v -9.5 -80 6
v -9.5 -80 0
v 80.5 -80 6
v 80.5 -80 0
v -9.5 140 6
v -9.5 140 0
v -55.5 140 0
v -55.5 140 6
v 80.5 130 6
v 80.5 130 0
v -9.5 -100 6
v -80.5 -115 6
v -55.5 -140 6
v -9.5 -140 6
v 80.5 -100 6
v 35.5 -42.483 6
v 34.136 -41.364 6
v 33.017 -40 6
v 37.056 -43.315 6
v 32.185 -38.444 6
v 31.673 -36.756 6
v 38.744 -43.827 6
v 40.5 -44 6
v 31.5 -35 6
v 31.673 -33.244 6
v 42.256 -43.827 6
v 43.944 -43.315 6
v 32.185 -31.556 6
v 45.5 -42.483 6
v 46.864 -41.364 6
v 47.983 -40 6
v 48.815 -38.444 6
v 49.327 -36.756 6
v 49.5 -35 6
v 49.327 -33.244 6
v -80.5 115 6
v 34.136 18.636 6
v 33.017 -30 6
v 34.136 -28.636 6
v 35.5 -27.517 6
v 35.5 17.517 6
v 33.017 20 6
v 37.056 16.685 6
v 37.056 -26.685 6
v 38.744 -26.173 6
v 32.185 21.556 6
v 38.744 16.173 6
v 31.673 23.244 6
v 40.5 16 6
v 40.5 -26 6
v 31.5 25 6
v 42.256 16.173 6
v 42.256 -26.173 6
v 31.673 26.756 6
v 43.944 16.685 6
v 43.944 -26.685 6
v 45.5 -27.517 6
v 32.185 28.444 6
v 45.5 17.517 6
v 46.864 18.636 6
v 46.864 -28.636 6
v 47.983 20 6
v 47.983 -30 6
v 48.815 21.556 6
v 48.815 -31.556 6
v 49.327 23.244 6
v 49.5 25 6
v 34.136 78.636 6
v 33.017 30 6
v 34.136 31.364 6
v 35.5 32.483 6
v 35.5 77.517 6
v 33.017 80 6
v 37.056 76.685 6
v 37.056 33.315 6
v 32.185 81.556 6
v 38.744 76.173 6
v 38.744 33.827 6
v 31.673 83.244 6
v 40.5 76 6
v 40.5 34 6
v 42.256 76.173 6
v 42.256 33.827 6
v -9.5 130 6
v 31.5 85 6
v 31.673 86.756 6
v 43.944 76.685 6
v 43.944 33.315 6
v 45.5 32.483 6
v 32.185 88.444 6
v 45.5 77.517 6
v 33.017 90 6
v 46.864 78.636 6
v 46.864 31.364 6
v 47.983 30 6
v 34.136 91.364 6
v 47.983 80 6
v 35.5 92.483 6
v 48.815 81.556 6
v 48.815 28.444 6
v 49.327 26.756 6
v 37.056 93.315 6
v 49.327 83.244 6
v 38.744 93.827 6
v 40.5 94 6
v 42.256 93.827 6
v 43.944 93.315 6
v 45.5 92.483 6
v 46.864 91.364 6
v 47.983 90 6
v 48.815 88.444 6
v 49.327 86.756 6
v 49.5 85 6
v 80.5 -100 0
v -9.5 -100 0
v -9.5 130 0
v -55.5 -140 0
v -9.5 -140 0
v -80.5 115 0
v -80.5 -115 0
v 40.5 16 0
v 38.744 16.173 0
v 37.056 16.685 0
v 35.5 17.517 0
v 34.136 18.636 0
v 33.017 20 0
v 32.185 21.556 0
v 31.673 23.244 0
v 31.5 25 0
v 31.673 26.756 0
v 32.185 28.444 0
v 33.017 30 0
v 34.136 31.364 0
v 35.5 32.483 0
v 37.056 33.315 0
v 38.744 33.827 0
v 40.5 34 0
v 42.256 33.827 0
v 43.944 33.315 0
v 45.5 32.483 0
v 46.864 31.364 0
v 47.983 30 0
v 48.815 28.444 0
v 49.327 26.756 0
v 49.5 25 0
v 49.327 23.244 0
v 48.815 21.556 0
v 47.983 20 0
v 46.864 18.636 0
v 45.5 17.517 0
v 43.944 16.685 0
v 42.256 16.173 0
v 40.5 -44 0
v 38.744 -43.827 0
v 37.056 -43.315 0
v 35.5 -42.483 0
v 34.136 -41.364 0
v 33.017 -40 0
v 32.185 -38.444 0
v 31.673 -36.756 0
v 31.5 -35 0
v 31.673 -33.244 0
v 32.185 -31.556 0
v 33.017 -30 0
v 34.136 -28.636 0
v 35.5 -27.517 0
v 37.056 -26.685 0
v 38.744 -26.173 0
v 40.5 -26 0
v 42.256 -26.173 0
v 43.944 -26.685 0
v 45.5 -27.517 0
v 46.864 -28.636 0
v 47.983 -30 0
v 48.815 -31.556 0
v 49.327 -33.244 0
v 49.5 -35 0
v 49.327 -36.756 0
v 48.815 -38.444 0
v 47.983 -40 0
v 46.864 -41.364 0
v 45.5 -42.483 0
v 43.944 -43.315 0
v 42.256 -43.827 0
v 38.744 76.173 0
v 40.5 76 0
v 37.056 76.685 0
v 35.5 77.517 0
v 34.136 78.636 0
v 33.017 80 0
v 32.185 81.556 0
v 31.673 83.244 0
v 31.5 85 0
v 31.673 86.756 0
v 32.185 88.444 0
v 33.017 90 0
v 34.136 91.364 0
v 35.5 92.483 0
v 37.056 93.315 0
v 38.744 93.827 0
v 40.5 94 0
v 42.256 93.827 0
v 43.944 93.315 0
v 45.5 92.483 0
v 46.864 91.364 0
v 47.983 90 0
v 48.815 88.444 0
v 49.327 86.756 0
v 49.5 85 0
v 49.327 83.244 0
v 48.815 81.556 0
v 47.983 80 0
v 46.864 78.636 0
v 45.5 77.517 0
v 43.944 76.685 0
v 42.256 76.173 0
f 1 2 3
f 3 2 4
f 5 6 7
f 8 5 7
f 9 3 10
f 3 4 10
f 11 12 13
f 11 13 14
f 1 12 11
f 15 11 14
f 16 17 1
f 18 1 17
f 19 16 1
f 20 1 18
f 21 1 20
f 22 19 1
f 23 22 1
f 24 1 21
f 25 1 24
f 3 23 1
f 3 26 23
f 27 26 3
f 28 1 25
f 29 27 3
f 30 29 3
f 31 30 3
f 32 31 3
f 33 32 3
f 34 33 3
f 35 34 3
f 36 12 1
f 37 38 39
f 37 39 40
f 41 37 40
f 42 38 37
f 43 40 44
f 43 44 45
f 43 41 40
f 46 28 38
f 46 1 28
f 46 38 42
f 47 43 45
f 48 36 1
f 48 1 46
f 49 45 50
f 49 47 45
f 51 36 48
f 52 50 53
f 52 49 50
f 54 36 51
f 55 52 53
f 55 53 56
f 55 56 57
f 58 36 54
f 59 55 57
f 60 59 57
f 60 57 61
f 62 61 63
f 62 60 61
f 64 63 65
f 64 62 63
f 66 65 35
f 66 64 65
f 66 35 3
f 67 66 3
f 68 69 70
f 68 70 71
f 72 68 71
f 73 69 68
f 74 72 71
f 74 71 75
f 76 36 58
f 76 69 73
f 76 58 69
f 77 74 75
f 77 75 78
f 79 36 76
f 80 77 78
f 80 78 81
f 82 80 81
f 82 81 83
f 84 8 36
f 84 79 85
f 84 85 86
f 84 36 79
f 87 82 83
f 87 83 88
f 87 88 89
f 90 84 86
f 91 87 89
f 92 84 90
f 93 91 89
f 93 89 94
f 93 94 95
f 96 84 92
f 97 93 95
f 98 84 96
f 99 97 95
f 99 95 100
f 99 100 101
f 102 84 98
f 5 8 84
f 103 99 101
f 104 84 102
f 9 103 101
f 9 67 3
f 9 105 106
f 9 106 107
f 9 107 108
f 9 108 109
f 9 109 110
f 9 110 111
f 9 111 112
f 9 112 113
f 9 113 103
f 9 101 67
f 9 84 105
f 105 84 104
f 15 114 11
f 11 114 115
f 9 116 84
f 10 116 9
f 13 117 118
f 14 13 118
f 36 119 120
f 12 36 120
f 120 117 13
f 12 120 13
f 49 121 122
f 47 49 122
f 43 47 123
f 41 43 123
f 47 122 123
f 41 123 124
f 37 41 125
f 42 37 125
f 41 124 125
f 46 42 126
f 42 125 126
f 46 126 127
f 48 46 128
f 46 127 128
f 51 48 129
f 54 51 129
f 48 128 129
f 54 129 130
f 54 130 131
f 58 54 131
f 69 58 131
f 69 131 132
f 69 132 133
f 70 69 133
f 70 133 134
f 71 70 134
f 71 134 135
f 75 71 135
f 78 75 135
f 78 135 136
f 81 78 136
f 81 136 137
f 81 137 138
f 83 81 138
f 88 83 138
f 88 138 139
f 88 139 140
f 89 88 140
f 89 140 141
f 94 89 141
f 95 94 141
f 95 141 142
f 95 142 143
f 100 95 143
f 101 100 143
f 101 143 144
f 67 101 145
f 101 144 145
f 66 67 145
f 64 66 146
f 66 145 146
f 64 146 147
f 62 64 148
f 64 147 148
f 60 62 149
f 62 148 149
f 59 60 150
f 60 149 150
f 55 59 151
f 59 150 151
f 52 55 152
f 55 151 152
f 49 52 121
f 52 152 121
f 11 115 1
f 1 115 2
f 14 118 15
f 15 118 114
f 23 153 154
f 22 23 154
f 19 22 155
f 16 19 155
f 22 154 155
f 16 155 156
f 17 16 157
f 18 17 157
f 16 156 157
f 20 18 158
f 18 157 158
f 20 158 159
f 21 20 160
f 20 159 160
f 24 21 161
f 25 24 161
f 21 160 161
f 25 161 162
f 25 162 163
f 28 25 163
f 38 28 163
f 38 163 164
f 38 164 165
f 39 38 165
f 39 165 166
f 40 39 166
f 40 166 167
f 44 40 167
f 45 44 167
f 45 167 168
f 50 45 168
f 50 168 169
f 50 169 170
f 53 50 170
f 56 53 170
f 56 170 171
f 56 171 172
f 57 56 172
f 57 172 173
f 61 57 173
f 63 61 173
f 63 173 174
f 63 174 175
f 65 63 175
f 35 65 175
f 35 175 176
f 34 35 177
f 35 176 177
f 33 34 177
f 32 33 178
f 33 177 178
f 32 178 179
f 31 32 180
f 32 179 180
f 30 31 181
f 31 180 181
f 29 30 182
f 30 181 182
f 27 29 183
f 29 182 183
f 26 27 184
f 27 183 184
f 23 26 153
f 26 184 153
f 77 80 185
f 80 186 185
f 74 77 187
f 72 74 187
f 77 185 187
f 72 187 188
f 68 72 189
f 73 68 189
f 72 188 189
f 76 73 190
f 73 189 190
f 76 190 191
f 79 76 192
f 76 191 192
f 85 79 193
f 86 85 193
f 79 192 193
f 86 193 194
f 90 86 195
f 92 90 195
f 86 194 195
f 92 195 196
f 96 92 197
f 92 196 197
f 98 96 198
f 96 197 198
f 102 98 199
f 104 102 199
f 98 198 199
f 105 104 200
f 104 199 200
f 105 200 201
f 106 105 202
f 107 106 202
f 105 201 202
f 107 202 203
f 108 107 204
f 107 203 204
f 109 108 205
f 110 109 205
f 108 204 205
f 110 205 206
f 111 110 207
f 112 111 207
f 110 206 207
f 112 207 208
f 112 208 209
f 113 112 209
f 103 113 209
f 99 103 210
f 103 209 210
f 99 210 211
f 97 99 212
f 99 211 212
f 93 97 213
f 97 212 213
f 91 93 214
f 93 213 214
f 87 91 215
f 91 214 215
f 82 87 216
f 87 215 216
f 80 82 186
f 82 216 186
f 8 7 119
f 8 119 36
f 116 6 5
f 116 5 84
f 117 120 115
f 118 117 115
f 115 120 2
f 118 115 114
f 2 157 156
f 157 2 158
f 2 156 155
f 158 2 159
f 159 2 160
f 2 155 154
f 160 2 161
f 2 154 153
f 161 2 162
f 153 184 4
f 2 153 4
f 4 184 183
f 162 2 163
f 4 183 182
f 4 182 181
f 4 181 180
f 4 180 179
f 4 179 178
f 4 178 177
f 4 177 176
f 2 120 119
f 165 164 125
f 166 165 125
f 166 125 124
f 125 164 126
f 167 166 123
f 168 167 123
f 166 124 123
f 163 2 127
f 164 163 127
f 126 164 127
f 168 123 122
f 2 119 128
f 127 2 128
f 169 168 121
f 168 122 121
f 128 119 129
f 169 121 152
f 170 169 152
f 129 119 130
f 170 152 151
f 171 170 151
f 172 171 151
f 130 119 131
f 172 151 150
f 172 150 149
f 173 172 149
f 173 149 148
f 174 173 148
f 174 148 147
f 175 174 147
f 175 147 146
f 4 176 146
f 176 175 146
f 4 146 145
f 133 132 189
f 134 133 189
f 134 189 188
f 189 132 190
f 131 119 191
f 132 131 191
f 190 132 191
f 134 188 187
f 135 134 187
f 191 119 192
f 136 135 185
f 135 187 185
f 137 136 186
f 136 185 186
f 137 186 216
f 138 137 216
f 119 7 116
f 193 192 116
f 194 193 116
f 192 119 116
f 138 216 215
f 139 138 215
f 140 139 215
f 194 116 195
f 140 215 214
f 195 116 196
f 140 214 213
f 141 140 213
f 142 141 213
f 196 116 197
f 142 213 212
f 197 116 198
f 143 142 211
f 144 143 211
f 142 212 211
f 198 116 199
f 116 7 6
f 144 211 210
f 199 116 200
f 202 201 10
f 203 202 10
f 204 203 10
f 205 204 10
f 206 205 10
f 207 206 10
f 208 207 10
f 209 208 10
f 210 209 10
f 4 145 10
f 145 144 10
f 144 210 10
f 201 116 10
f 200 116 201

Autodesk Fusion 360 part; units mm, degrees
sketch "スケッチ1" plane through (0, 0, 0) normal (0, 0, 1) x (1, 0, 0)
  line L0 (-9.5, 140) -> (-80.5, 140)
  line L1 (-80.5, 140) -> (-80.5, -140)
  line L2 (-80.5, -140) -> (-9.5, -140)
  line L3 (80.5, -80) -> (80.5, 130)
  line L4 (74.75, 130) -> (-80.5, -140) construction
  line L5 (-9.5, 140) -> (-9.5, 130)
  line L6 (-9.5, 130) -> (80.5, 130)
  line L7 (-80.5, -140) -> (-9.5, -140) construction
  line L8 (-9.5, -140) -> (80.5, -100)
  line L9 (80.5, -100) -> (-9.5, -100)
  line L10 (-9.5, -100) -> (-9.5, -80)
  line L11 (-9.5, -80) -> (80.5, -80)
  line L12 (-80.5, 140) -> (46, -80) construction
  line L13 (57.5, -100) -> (62.1814, -108.1416) construction
  dimension "d2" = 280
  dimension "d5" = 71
  dimension "d7" = 90
  dimension "d8" = 20
extrude "押し出し1" add sketch "スケッチ1" along normal blind 6
chamfer "面取り1" distance 25 angle 45 2 edges at (-80.5, -140, 3) (-80.5, 140, 3)
sketch "スケッチ2" plane through (0, 0, 6) normal (0, 0, 1) x (-1, 0, 0)
  line L0 (55.5, -140) -> (80.5, -115)
  line L1 (80.5, -115) -> (80.5, 115)
  line L2 (80.5, 115) -> (55.5, 140)
  line L3 (55.5, 140) -> (9.5, 140)
  line L4 (9.5, 140) -> (-80.5, 100)
  line L5 (-80.5, 100) -> (9.5, 100)
  line L6 (9.5, 100) -> (9.5, 80)
  line L7 (9.5, 80) -> (-80.5, 80)
  line L8 (-80.5, 80) -> (-80.5, -130)
  line L9 (-80.5, -130) -> (9.5, -130)
  line L10 (9.5, -130) -> (9.5, -140)
  line L11 (9.5, -140) -> (55.5, -140)
  line L12 (-80.5, -130) -> (-40.5, -130) construction
  line L13 (-40.5, -130) -> (-40.5, -85) construction
  line L14 (-40.5, -85) -> (-80.5, -85) construction
  line L15 (-80.5, -85) -> (-80.5, -130) construction
  line L16 (-40.5, -85) -> (-40.5, -25) construction
  line L17 (-40.5, -25) -> (-40.5, 35) construction
  point P0 (-40.5, -85)
  point P1 (-40.5, -25)
  point P2 (-40.5, 35)
  dimension "d12" = 40
  dimension "d13" = 45
  dimension "d14" = 60
  dimension "d15" = 60
hole "穴1" at (40.5, 85, 6) at (40.5, 25, 6) at (40.5, -35, 6) direction (0, 0, -1) diameter 18 end through all
equation "d5 = 25 mm + 46 mm"
